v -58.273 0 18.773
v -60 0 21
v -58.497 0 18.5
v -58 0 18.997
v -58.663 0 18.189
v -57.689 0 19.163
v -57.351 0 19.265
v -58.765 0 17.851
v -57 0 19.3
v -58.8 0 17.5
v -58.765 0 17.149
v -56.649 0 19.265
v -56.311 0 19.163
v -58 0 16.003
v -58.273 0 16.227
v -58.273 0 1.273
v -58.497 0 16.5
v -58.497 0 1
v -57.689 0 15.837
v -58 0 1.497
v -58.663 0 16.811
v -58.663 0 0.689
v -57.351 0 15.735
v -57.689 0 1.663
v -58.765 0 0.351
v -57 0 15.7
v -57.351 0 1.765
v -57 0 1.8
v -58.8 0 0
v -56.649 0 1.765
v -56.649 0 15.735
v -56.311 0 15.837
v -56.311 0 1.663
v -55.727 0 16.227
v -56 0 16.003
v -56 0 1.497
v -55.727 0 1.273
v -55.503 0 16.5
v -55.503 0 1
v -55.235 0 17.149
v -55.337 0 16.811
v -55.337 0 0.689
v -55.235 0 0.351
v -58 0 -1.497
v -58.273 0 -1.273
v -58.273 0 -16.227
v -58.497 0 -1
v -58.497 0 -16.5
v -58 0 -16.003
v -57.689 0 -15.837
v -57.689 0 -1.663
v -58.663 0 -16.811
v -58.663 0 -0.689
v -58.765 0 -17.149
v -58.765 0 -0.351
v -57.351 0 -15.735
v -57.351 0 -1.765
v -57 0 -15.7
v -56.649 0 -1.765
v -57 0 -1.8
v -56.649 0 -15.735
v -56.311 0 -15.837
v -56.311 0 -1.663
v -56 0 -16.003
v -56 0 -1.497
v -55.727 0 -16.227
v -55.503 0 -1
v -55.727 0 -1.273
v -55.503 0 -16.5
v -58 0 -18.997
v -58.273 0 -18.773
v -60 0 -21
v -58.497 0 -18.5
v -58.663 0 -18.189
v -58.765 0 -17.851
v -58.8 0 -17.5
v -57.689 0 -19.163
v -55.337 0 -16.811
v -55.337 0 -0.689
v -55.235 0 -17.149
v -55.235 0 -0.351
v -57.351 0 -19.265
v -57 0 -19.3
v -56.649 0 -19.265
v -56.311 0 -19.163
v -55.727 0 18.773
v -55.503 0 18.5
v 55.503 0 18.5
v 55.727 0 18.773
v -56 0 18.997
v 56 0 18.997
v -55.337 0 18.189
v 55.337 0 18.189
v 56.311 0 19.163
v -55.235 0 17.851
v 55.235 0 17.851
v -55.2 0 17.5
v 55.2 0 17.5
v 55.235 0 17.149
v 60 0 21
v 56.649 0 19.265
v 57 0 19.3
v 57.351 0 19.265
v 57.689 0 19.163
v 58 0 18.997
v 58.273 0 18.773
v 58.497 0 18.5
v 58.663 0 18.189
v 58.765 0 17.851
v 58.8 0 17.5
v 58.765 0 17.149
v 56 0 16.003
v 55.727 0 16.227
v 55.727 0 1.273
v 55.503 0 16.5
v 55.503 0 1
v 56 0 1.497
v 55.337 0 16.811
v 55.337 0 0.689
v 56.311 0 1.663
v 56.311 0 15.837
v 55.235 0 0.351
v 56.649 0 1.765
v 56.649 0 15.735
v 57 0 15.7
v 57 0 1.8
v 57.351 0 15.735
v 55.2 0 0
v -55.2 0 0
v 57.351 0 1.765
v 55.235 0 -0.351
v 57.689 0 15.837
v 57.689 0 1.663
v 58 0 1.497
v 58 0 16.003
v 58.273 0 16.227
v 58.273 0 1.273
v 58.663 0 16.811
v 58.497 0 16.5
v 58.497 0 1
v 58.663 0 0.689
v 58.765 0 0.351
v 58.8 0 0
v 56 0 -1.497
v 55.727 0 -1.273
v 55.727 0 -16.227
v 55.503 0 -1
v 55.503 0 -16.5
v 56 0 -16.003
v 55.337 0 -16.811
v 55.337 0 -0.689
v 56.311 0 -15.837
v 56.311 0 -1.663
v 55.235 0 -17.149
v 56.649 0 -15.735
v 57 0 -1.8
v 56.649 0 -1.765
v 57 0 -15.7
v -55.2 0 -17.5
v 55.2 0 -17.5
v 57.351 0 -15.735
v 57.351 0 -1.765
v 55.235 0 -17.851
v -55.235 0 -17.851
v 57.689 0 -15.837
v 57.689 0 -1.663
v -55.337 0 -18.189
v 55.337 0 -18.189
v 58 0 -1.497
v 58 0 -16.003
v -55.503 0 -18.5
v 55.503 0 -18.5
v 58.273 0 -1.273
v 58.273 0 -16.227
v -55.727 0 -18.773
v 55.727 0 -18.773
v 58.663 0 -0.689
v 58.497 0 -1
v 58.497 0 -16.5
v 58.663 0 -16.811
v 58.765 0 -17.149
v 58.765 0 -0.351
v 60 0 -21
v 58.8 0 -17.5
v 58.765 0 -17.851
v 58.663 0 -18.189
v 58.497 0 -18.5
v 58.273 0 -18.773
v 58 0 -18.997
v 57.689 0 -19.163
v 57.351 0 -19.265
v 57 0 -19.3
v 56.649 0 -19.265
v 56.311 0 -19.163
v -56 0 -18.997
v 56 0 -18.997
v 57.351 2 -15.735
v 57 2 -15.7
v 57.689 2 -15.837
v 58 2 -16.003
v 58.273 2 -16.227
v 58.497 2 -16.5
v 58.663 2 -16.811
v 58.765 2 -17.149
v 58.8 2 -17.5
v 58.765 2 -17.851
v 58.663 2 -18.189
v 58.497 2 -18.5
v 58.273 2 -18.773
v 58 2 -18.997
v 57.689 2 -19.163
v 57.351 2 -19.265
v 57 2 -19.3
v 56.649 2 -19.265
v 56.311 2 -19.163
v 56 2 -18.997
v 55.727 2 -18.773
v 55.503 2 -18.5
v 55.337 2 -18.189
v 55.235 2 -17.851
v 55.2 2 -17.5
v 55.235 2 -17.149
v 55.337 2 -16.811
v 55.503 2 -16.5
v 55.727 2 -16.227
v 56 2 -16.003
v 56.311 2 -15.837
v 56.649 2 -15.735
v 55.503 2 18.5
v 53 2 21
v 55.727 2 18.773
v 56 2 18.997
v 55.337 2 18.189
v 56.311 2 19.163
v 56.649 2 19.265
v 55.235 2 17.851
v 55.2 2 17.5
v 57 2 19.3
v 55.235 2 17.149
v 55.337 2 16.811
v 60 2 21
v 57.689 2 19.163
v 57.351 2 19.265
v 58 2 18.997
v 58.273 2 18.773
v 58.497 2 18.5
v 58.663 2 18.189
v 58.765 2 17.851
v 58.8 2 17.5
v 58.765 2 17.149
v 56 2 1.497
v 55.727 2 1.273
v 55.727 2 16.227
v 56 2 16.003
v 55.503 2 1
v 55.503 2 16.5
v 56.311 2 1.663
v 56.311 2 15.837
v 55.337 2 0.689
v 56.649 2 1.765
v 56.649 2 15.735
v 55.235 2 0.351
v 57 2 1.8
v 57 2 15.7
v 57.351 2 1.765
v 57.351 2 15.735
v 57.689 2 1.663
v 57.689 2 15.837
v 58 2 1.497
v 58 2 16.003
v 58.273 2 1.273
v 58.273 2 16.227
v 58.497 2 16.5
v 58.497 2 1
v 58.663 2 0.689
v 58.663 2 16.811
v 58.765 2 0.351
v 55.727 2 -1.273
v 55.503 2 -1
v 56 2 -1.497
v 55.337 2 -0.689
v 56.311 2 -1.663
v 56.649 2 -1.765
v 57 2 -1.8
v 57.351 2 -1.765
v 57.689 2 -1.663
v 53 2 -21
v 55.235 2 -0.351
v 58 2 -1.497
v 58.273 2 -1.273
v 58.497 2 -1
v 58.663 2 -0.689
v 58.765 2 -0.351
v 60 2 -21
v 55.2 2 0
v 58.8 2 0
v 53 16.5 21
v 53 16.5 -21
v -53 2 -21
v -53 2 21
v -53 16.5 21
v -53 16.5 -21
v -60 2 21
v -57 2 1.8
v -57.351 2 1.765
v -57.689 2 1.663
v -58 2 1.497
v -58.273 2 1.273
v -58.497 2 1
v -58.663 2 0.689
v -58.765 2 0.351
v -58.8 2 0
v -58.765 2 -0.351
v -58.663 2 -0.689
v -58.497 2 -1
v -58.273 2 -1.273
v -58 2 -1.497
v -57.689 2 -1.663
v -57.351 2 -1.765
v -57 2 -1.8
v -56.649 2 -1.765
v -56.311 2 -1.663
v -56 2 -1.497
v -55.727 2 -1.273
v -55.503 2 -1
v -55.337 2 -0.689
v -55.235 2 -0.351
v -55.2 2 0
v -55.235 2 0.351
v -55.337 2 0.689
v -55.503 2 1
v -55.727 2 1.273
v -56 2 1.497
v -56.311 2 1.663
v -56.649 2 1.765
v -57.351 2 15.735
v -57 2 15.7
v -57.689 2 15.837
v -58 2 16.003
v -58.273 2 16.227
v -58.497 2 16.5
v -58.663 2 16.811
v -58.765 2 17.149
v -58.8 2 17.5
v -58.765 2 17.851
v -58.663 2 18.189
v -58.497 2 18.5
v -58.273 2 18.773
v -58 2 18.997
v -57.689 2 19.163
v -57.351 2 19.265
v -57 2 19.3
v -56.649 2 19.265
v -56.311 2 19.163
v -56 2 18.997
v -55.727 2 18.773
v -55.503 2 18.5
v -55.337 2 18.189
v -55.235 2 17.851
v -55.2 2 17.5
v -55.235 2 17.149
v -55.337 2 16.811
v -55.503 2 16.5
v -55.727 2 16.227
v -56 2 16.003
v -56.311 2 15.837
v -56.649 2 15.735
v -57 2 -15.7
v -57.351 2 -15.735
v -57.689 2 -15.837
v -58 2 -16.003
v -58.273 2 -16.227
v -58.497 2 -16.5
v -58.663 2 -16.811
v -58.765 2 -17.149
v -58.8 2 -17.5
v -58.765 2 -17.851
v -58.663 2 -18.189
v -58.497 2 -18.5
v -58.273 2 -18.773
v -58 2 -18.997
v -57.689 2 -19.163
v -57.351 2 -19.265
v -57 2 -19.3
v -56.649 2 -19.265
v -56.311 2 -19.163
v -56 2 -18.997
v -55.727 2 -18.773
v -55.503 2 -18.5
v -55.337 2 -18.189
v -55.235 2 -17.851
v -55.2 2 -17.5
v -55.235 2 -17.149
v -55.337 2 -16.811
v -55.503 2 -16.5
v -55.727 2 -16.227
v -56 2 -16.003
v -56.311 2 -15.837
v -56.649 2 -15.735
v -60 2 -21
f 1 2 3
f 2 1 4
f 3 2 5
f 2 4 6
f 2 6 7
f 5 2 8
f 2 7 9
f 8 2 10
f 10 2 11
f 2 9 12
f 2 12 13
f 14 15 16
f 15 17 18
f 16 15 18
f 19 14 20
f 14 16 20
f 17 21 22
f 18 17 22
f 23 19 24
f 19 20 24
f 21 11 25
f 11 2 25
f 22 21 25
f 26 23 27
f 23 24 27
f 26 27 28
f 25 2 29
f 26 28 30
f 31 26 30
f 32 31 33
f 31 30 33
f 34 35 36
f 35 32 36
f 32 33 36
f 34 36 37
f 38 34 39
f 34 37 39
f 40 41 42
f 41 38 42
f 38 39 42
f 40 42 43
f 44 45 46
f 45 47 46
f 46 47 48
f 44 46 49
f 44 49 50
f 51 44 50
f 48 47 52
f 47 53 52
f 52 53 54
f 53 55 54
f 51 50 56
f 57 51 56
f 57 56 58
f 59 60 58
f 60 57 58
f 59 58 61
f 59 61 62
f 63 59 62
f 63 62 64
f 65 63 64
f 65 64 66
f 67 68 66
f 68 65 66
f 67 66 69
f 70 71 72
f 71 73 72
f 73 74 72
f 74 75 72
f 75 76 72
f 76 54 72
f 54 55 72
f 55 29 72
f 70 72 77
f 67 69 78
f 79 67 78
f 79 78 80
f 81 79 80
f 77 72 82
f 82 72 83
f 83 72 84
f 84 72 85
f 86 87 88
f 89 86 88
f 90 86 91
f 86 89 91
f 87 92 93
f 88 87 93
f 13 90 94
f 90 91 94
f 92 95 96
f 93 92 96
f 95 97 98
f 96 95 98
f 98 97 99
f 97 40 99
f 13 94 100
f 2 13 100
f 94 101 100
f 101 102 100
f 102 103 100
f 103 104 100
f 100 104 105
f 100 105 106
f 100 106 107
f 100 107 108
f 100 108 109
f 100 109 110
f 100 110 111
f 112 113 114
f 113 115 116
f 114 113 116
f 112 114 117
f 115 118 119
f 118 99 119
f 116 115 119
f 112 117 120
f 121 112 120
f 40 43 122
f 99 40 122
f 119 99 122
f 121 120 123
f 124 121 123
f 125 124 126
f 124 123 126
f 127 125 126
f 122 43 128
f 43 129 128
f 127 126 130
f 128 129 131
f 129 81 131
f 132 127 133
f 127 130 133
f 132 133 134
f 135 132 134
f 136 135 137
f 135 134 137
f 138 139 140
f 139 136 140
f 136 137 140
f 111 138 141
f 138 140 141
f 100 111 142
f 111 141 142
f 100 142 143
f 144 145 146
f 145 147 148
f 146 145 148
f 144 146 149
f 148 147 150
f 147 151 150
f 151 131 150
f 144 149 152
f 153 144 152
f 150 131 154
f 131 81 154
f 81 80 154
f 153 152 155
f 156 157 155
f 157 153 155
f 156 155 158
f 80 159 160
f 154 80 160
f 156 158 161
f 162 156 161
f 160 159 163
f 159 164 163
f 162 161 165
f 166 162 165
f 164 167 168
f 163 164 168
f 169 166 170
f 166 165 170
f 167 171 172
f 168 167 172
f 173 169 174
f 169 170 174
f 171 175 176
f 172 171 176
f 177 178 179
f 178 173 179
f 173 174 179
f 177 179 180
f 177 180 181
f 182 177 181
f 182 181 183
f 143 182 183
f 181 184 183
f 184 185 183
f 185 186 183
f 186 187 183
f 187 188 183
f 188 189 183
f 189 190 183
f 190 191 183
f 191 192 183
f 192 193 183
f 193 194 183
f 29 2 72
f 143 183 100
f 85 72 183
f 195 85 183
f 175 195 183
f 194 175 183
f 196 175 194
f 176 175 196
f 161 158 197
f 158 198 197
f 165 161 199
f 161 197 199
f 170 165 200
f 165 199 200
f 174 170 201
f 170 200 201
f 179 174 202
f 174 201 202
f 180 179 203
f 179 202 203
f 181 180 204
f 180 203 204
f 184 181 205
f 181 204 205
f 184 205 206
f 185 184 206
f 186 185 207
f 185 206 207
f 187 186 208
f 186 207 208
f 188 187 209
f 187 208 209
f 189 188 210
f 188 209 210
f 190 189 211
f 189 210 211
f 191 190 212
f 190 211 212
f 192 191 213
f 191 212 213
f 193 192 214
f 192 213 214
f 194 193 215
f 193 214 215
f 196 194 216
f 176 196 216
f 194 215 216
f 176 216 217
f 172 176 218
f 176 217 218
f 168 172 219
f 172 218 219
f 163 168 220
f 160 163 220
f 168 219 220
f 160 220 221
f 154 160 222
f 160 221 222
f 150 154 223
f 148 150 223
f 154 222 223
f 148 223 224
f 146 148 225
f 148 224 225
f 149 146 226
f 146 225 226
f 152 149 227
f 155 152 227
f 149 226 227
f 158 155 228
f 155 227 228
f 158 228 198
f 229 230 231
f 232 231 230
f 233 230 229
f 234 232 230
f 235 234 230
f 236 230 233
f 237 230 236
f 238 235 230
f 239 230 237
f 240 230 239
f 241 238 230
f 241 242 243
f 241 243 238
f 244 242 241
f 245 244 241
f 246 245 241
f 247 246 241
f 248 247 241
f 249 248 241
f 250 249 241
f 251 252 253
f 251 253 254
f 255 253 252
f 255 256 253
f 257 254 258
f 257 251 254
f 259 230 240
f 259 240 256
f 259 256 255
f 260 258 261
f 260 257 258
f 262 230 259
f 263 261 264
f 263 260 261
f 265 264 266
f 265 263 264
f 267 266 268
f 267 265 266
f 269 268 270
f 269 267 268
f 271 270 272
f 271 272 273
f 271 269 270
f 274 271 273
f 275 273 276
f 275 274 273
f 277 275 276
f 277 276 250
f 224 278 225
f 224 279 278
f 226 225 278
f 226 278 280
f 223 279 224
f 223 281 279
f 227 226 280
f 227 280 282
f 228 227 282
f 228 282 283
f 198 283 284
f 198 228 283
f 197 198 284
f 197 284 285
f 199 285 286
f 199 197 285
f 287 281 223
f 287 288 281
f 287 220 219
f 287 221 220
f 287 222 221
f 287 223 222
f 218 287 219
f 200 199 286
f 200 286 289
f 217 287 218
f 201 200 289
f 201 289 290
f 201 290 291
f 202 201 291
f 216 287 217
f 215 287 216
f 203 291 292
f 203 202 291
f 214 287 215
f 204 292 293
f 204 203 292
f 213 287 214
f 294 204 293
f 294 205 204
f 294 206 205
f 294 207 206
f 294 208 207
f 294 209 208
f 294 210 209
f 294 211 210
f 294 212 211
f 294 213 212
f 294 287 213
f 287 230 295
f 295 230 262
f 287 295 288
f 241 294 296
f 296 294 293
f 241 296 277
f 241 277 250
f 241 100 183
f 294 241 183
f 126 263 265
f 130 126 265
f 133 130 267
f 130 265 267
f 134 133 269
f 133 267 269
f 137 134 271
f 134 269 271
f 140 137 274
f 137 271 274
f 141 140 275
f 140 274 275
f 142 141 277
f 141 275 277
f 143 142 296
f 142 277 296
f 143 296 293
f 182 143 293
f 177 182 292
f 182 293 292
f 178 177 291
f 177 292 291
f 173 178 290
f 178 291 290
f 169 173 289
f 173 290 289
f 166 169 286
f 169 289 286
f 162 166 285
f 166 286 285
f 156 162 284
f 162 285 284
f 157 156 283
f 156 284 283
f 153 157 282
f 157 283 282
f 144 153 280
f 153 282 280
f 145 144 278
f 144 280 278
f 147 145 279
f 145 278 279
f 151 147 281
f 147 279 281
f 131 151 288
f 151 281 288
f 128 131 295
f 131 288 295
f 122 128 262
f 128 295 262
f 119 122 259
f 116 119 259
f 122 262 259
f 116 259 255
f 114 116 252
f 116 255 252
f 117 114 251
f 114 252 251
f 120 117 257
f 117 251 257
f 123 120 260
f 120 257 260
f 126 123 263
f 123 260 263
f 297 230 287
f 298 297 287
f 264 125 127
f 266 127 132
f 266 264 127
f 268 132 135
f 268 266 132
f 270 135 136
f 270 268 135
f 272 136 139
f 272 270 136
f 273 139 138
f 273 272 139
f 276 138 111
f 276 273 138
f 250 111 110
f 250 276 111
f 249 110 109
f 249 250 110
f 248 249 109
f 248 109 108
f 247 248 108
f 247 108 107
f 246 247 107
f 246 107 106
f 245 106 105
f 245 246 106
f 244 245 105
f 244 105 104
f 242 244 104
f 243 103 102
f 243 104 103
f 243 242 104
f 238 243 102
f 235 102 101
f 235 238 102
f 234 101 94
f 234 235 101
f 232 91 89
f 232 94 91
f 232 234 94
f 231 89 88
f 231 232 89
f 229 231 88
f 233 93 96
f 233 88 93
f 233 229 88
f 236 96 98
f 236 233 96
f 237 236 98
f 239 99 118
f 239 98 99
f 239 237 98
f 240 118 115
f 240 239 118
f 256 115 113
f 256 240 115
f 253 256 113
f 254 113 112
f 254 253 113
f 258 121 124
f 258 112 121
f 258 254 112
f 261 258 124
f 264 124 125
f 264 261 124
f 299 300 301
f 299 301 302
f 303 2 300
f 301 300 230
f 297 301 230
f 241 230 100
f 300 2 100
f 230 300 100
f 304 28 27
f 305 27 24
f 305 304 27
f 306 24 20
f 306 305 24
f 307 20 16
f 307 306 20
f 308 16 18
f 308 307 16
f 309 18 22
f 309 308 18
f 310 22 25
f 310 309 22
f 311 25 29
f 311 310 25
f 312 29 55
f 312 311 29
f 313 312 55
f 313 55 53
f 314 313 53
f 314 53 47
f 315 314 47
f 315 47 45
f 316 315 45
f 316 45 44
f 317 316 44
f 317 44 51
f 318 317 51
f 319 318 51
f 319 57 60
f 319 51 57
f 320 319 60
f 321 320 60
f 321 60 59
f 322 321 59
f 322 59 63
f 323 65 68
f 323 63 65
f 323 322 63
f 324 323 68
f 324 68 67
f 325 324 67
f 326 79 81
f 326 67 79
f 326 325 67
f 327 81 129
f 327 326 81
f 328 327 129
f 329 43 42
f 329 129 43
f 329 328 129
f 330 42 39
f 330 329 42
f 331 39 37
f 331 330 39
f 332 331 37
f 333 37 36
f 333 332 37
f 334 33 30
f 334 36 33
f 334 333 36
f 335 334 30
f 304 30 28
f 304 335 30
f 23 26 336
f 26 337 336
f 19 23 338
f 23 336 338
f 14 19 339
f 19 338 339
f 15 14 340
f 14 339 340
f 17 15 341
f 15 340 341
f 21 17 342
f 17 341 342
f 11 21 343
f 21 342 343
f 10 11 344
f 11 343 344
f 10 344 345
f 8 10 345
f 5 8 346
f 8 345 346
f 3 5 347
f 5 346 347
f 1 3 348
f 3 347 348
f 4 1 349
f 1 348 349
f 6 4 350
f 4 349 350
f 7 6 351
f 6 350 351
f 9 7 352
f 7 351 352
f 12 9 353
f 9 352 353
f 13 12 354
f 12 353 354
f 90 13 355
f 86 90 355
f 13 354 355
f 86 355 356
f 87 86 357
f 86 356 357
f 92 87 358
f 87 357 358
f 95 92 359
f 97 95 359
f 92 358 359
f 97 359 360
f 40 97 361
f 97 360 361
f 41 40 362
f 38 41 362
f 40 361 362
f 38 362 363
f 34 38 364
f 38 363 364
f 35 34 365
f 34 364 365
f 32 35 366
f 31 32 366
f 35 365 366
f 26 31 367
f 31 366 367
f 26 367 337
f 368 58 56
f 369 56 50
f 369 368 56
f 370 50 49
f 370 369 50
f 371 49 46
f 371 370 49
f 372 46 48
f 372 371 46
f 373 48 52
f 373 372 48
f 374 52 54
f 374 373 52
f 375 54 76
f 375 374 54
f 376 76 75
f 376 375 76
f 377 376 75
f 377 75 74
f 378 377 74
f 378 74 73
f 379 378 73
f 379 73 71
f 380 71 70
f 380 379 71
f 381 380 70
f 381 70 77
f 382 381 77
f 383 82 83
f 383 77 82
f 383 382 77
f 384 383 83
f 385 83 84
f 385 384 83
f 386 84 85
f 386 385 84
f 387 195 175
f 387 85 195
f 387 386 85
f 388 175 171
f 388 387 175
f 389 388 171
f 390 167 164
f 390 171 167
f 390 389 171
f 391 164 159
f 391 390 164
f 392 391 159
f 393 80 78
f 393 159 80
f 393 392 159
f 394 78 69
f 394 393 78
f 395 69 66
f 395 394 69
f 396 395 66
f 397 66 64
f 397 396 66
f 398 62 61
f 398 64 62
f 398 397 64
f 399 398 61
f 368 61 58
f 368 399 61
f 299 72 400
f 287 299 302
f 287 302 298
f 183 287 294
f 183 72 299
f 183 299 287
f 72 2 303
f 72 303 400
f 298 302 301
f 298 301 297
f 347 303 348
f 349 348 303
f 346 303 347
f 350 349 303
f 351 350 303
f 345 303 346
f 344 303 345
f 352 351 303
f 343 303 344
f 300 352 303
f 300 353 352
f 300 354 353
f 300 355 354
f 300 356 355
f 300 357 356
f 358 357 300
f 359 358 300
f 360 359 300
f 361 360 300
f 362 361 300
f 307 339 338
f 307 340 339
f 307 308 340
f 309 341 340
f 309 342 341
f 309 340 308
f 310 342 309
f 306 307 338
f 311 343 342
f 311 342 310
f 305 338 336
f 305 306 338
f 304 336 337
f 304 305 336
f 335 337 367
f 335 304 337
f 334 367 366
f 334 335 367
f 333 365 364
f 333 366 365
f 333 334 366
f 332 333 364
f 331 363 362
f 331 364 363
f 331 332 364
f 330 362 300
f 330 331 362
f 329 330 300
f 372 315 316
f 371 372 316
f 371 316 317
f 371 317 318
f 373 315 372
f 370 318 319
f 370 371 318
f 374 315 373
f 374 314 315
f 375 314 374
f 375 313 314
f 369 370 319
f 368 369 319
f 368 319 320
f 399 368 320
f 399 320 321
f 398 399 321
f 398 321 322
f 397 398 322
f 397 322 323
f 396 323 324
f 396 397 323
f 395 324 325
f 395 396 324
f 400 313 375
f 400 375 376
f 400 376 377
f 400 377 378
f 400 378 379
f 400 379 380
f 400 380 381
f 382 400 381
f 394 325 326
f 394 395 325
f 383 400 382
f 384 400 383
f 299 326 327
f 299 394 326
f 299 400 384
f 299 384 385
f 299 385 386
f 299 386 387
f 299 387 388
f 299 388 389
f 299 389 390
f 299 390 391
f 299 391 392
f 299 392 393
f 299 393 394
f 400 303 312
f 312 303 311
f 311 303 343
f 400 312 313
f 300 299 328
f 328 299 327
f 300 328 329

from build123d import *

# Parameters (mm, degrees)
SKETCH_1_W                  = 120
SKETCH_1_H                  = 42
EXTRUDE_1_DEPTH             = 2
SKETCH_2_W                  = 106
SKETCH_2_H                  = 42
EXTRUDE_2_DEPTH             = 14.5
HOLE_WIZARD_M3_1_AT_2_COUNT = 2
HOLE_WIZARD_M3_1_AT_2_PITCH = 17.5


with BuildPart() as part:
    # ｽｹｯﾁ1 → ﾎﾞｽ - 押し出し1 (new body)
    with BuildSketch(Plane(origin=(0, 0, 0), x_dir=(1, 0, 0), z_dir=(0, 1, 0))):
        Rectangle(SKETCH_1_W, SKETCH_1_H)
    extrude(amount=EXTRUDE_1_DEPTH)

    # ｽｹｯﾁ2 → ﾎﾞｽ - 押し出し2 (add)
    with BuildSketch(Plane(origin=(0, 2, 0), x_dir=(1, 0, 0), z_dir=(0, 1, 0))):
        Rectangle(SKETCH_2_W, SKETCH_2_H)
    extrude(amount=EXTRUDE_2_DEPTH)

    # ｽｹｯﾁ4 → M3 すきま穴1 (revolve, cut)
    with BuildSketch(Plane(origin=(-57, 2, -17.5), x_dir=(0, 0, 1), z_dir=(1, 0, 0))):
        Polygon((0, 0), (0, 6.081549114), (1.8, 5), (1.8, 0), align=None)
    hole_wizard_m3_1 = revolve(axis=Axis((-57, 8.35, -17.5), (0, -1, 0)), mode=Mode.SUBTRACT)

    # M3 すきま穴1 at 2: M3 すきま穴1 ×2
    with Locations(*[(0, 0, i * HOLE_WIZARD_M3_1_AT_2_PITCH) for i in range(1, HOLE_WIZARD_M3_1_AT_2_COUNT)]):
        add(hole_wizard_m3_1, mode=Mode.SUBTRACT)

    # ﾐﾗｰ1: M3 すきま穴1 across plane
    add(hole_wizard_m3_1.mirror(Plane.XY), mode=Mode.SUBTRACT)

    # ﾐﾗｰ1 copy 1 sketch → ﾐﾗｰ1 copy 1 (revolve, cut)
    with BuildSketch(Plane(origin=(-57, 2, 0), x_dir=(0, 0, -1), z_dir=(1, 0, 0))):
        Polygon((0, 0), (0, -6.081549114), (1.8, -5), (1.8, 0), align=None)
    revolve(axis=Axis((-57, 8.35, 0), (0, 1, 0)), mode=Mode.SUBTRACT)

    # ﾐﾗｰ2: M3 すきま穴1 across plane
    add(hole_wizard_m3_1.mirror(Plane(origin=(0, 0, 0), x_dir=(0, 0, 1), z_dir=(1, 0, 0))), mode=Mode.SUBTRACT)

    # ﾐﾗｰ2 copy 1 sketch → ﾐﾗｰ2 copy 1 (revolve, cut)
    with BuildSketch(Plane(origin=(57, 2, 0), x_dir=(0, 0, 1), z_dir=(-1, 0, 0))):
        Polygon((0, 0), (0, -6.081549114), (1.8, -5), (1.8, 0), align=None)
    revolve(axis=Axis((57, 8.35, 0), (0, 1, 0)), mode=Mode.SUBTRACT)

    # ﾐﾗｰ2 copy 2 sketch → ﾐﾗｰ2 copy 2 (revolve, cut)
    with BuildSketch(Plane(origin=(57, 2, 17.5), x_dir=(0, 0, -1), z_dir=(-1, 0, 0))):
        Polygon((0, 0), (0, 6.081549114), (1.8, 5), (1.8, 0), align=None)
    revolve(axis=Axis((57, 8.35, 17.5), (0, -1, 0)), mode=Mode.SUBTRACT)

    # ﾐﾗｰ2 copy 3 sketch → ﾐﾗｰ2 copy 3 (revolve, cut)
    with BuildSketch(Plane(origin=(57, 2, 0), x_dir=(0, 0, -1), z_dir=(-1, 0, 0))):
        Polygon((0, 0), (0, 6.081549114), (1.8, 5), (1.8, 0), align=None)
    revolve(axis=Axis((57, 8.35, 0), (0, -1, 0)), mode=Mode.SUBTRACT)


solid = part.part
